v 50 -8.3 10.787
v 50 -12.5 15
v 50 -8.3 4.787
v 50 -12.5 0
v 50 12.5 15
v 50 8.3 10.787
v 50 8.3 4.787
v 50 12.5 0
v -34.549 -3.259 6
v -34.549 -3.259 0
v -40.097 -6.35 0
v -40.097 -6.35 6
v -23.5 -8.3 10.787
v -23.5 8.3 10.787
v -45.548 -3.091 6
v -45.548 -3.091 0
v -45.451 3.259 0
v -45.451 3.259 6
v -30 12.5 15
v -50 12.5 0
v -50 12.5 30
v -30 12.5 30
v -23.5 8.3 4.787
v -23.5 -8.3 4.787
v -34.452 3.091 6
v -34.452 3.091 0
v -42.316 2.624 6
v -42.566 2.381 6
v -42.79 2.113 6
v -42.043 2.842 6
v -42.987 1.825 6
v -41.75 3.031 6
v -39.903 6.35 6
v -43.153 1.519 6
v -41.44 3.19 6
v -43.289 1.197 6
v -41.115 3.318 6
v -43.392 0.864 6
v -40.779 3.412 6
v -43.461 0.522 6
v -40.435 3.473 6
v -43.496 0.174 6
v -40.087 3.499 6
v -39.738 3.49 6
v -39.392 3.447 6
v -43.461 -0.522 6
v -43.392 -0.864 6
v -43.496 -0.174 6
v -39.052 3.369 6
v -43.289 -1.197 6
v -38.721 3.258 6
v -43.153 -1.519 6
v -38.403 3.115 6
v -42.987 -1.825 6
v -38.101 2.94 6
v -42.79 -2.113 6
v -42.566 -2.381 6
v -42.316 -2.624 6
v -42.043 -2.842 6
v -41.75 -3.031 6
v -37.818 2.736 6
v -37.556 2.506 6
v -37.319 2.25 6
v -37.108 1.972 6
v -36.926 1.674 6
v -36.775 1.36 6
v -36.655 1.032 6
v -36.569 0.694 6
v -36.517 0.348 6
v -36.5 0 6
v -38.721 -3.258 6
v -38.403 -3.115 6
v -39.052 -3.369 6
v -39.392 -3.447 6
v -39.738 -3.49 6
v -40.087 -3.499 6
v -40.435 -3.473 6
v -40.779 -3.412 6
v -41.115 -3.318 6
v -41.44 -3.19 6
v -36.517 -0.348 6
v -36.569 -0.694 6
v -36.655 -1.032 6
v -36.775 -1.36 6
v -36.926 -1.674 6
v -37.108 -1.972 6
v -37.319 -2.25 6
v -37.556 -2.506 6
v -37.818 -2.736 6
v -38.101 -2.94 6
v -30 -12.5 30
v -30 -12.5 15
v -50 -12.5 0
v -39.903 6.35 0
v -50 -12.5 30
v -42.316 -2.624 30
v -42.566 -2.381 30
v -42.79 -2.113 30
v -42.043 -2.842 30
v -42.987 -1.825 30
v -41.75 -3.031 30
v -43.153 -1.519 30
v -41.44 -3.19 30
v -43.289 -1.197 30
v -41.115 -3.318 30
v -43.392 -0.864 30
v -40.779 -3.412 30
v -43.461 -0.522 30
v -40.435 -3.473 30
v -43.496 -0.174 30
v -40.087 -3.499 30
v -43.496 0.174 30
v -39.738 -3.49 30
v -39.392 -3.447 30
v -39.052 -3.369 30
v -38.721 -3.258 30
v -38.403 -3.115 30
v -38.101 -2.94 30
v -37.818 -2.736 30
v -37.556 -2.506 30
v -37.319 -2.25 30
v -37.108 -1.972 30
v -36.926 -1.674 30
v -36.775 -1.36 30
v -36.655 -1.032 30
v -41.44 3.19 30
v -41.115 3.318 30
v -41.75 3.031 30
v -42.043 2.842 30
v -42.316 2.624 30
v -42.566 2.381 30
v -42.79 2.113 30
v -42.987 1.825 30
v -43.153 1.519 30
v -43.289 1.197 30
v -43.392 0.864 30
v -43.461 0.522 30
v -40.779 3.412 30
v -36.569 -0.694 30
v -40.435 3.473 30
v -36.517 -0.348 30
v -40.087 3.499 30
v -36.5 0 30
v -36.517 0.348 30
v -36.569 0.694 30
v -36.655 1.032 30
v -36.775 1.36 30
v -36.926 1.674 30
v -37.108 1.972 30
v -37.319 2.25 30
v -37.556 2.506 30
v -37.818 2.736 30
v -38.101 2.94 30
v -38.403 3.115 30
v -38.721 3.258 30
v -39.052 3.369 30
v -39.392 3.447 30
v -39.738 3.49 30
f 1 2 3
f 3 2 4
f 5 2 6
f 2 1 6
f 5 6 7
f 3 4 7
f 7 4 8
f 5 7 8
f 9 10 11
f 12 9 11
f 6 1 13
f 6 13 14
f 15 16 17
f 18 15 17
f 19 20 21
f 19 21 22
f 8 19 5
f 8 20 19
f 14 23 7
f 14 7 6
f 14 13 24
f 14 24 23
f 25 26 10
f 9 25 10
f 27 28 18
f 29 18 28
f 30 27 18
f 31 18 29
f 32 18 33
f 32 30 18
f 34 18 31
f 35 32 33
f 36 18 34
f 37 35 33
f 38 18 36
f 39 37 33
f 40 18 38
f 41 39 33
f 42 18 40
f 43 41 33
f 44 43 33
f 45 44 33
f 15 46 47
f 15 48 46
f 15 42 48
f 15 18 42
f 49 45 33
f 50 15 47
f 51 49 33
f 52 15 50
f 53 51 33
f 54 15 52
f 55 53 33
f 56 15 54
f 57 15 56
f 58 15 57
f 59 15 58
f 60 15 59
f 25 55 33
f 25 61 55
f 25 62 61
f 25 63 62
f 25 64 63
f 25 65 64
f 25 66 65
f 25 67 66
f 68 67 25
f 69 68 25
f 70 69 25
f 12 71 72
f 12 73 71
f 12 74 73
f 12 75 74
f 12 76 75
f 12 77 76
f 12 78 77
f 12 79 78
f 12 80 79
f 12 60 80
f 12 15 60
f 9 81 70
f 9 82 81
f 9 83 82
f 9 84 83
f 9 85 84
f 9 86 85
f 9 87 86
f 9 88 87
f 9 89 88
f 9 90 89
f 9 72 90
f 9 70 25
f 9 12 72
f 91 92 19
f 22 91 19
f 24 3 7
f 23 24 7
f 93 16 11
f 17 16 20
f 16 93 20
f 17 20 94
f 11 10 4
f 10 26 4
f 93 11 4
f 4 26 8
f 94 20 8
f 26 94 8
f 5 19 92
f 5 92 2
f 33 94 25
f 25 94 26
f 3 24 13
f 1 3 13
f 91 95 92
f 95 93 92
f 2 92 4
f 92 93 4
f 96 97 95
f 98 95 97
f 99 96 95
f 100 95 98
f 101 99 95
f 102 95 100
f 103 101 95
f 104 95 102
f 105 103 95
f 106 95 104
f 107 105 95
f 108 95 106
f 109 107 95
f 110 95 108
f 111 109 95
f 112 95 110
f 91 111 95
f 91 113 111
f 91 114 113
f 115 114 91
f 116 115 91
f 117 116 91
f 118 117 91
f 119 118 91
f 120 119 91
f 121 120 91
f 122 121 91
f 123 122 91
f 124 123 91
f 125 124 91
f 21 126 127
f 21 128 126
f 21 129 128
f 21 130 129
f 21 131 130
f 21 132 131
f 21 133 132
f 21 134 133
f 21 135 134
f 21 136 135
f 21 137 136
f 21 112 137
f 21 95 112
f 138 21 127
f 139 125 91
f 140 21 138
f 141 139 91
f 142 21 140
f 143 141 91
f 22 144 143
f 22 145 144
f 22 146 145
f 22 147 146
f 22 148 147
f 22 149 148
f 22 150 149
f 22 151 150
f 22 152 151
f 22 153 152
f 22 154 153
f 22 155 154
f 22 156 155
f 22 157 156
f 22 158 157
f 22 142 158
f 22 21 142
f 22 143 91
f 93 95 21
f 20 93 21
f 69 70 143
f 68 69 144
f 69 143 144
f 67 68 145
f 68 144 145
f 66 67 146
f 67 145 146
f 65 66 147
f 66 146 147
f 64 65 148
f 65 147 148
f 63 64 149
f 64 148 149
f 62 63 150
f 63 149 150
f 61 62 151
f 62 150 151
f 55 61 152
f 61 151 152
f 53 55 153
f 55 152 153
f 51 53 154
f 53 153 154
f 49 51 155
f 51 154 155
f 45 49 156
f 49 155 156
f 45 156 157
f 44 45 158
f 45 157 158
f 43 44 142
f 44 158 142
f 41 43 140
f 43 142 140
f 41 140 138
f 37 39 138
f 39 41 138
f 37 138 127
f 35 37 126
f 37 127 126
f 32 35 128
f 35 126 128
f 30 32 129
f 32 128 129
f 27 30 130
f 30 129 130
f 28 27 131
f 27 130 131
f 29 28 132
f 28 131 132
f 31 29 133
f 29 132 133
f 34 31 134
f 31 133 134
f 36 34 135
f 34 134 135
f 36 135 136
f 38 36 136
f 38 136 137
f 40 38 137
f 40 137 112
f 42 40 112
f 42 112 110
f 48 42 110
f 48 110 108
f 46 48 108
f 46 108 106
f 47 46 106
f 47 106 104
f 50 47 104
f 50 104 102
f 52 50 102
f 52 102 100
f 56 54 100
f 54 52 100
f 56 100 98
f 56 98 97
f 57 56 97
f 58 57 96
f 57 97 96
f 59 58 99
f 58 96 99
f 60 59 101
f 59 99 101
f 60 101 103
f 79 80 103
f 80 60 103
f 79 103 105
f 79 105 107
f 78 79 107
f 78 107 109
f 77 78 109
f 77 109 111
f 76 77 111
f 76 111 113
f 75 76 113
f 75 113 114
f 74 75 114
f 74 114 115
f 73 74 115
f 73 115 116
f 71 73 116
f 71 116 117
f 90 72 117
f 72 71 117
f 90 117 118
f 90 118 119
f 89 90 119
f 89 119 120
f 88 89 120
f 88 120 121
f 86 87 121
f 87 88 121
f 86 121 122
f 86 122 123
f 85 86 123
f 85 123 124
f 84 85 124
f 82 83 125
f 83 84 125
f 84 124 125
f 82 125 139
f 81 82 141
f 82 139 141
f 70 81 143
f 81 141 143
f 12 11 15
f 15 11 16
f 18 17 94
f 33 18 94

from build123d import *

# Parameters (mm, degrees)
F0_W     = 100
F0_H     = 25
F1_DEPTH = 15
F2_W     = 16.6
F2_H     = 6
F3_DEPTH = 73.5
F4_W     = 20
F4_H     = 25
F5_DEPTH = 15
F6_R     = 3.5
F7_DEPTH = 30.001
F8_R     = 3.5
F9_DEPTH = 6


with BuildPart() as f1:
    # F0 (on Top) → F1 (new body)
    with BuildSketch(Plane.XY):
        Rectangle(F0_W, F0_H)
    extrude(amount=F1_DEPTH)

    # F2 (on face) → F3 (cut)
    with BuildSketch(Plane.YZ.offset(50)):
        with Locations((0, 7.786861)):
            Rectangle(F2_W, F2_H)
    extrude(amount=-F3_DEPTH, mode=Mode.SUBTRACT)

    # F4 (on face) → F5 (join)
    with BuildSketch(Plane.XY.offset(15)):
        with Locations((-40, 0)):
            Rectangle(F4_W, F4_H)
    extrude(amount=F5_DEPTH)

    # F6 (on face) → F7 (cut, through all)
    with BuildSketch(Plane.XY.offset(30)):
        with Locations((-40, 0)):
            Circle(F6_R)
    extrude(amount=-F7_DEPTH, mode=Mode.SUBTRACT)

    # F8 (on face) → F9 (cut)
    with BuildSketch(Plane(origin=(0, 0, 0), x_dir=(1, 0, 0), z_dir=(0, 0, -1))):
        Polygon((-40.096797, 6.350115), (-45.54776, 3.091229), (-45.450962, -3.258887), (-39.903203, -6.350115), (-34.45224, -3.091229), (-34.549038, 3.258887), align=None)
        with Locations((-40, 0)):
            Circle(F8_R, mode=Mode.SUBTRACT)
    extrude(amount=-F9_DEPTH, mode=Mode.SUBTRACT)


solid = f1.part
